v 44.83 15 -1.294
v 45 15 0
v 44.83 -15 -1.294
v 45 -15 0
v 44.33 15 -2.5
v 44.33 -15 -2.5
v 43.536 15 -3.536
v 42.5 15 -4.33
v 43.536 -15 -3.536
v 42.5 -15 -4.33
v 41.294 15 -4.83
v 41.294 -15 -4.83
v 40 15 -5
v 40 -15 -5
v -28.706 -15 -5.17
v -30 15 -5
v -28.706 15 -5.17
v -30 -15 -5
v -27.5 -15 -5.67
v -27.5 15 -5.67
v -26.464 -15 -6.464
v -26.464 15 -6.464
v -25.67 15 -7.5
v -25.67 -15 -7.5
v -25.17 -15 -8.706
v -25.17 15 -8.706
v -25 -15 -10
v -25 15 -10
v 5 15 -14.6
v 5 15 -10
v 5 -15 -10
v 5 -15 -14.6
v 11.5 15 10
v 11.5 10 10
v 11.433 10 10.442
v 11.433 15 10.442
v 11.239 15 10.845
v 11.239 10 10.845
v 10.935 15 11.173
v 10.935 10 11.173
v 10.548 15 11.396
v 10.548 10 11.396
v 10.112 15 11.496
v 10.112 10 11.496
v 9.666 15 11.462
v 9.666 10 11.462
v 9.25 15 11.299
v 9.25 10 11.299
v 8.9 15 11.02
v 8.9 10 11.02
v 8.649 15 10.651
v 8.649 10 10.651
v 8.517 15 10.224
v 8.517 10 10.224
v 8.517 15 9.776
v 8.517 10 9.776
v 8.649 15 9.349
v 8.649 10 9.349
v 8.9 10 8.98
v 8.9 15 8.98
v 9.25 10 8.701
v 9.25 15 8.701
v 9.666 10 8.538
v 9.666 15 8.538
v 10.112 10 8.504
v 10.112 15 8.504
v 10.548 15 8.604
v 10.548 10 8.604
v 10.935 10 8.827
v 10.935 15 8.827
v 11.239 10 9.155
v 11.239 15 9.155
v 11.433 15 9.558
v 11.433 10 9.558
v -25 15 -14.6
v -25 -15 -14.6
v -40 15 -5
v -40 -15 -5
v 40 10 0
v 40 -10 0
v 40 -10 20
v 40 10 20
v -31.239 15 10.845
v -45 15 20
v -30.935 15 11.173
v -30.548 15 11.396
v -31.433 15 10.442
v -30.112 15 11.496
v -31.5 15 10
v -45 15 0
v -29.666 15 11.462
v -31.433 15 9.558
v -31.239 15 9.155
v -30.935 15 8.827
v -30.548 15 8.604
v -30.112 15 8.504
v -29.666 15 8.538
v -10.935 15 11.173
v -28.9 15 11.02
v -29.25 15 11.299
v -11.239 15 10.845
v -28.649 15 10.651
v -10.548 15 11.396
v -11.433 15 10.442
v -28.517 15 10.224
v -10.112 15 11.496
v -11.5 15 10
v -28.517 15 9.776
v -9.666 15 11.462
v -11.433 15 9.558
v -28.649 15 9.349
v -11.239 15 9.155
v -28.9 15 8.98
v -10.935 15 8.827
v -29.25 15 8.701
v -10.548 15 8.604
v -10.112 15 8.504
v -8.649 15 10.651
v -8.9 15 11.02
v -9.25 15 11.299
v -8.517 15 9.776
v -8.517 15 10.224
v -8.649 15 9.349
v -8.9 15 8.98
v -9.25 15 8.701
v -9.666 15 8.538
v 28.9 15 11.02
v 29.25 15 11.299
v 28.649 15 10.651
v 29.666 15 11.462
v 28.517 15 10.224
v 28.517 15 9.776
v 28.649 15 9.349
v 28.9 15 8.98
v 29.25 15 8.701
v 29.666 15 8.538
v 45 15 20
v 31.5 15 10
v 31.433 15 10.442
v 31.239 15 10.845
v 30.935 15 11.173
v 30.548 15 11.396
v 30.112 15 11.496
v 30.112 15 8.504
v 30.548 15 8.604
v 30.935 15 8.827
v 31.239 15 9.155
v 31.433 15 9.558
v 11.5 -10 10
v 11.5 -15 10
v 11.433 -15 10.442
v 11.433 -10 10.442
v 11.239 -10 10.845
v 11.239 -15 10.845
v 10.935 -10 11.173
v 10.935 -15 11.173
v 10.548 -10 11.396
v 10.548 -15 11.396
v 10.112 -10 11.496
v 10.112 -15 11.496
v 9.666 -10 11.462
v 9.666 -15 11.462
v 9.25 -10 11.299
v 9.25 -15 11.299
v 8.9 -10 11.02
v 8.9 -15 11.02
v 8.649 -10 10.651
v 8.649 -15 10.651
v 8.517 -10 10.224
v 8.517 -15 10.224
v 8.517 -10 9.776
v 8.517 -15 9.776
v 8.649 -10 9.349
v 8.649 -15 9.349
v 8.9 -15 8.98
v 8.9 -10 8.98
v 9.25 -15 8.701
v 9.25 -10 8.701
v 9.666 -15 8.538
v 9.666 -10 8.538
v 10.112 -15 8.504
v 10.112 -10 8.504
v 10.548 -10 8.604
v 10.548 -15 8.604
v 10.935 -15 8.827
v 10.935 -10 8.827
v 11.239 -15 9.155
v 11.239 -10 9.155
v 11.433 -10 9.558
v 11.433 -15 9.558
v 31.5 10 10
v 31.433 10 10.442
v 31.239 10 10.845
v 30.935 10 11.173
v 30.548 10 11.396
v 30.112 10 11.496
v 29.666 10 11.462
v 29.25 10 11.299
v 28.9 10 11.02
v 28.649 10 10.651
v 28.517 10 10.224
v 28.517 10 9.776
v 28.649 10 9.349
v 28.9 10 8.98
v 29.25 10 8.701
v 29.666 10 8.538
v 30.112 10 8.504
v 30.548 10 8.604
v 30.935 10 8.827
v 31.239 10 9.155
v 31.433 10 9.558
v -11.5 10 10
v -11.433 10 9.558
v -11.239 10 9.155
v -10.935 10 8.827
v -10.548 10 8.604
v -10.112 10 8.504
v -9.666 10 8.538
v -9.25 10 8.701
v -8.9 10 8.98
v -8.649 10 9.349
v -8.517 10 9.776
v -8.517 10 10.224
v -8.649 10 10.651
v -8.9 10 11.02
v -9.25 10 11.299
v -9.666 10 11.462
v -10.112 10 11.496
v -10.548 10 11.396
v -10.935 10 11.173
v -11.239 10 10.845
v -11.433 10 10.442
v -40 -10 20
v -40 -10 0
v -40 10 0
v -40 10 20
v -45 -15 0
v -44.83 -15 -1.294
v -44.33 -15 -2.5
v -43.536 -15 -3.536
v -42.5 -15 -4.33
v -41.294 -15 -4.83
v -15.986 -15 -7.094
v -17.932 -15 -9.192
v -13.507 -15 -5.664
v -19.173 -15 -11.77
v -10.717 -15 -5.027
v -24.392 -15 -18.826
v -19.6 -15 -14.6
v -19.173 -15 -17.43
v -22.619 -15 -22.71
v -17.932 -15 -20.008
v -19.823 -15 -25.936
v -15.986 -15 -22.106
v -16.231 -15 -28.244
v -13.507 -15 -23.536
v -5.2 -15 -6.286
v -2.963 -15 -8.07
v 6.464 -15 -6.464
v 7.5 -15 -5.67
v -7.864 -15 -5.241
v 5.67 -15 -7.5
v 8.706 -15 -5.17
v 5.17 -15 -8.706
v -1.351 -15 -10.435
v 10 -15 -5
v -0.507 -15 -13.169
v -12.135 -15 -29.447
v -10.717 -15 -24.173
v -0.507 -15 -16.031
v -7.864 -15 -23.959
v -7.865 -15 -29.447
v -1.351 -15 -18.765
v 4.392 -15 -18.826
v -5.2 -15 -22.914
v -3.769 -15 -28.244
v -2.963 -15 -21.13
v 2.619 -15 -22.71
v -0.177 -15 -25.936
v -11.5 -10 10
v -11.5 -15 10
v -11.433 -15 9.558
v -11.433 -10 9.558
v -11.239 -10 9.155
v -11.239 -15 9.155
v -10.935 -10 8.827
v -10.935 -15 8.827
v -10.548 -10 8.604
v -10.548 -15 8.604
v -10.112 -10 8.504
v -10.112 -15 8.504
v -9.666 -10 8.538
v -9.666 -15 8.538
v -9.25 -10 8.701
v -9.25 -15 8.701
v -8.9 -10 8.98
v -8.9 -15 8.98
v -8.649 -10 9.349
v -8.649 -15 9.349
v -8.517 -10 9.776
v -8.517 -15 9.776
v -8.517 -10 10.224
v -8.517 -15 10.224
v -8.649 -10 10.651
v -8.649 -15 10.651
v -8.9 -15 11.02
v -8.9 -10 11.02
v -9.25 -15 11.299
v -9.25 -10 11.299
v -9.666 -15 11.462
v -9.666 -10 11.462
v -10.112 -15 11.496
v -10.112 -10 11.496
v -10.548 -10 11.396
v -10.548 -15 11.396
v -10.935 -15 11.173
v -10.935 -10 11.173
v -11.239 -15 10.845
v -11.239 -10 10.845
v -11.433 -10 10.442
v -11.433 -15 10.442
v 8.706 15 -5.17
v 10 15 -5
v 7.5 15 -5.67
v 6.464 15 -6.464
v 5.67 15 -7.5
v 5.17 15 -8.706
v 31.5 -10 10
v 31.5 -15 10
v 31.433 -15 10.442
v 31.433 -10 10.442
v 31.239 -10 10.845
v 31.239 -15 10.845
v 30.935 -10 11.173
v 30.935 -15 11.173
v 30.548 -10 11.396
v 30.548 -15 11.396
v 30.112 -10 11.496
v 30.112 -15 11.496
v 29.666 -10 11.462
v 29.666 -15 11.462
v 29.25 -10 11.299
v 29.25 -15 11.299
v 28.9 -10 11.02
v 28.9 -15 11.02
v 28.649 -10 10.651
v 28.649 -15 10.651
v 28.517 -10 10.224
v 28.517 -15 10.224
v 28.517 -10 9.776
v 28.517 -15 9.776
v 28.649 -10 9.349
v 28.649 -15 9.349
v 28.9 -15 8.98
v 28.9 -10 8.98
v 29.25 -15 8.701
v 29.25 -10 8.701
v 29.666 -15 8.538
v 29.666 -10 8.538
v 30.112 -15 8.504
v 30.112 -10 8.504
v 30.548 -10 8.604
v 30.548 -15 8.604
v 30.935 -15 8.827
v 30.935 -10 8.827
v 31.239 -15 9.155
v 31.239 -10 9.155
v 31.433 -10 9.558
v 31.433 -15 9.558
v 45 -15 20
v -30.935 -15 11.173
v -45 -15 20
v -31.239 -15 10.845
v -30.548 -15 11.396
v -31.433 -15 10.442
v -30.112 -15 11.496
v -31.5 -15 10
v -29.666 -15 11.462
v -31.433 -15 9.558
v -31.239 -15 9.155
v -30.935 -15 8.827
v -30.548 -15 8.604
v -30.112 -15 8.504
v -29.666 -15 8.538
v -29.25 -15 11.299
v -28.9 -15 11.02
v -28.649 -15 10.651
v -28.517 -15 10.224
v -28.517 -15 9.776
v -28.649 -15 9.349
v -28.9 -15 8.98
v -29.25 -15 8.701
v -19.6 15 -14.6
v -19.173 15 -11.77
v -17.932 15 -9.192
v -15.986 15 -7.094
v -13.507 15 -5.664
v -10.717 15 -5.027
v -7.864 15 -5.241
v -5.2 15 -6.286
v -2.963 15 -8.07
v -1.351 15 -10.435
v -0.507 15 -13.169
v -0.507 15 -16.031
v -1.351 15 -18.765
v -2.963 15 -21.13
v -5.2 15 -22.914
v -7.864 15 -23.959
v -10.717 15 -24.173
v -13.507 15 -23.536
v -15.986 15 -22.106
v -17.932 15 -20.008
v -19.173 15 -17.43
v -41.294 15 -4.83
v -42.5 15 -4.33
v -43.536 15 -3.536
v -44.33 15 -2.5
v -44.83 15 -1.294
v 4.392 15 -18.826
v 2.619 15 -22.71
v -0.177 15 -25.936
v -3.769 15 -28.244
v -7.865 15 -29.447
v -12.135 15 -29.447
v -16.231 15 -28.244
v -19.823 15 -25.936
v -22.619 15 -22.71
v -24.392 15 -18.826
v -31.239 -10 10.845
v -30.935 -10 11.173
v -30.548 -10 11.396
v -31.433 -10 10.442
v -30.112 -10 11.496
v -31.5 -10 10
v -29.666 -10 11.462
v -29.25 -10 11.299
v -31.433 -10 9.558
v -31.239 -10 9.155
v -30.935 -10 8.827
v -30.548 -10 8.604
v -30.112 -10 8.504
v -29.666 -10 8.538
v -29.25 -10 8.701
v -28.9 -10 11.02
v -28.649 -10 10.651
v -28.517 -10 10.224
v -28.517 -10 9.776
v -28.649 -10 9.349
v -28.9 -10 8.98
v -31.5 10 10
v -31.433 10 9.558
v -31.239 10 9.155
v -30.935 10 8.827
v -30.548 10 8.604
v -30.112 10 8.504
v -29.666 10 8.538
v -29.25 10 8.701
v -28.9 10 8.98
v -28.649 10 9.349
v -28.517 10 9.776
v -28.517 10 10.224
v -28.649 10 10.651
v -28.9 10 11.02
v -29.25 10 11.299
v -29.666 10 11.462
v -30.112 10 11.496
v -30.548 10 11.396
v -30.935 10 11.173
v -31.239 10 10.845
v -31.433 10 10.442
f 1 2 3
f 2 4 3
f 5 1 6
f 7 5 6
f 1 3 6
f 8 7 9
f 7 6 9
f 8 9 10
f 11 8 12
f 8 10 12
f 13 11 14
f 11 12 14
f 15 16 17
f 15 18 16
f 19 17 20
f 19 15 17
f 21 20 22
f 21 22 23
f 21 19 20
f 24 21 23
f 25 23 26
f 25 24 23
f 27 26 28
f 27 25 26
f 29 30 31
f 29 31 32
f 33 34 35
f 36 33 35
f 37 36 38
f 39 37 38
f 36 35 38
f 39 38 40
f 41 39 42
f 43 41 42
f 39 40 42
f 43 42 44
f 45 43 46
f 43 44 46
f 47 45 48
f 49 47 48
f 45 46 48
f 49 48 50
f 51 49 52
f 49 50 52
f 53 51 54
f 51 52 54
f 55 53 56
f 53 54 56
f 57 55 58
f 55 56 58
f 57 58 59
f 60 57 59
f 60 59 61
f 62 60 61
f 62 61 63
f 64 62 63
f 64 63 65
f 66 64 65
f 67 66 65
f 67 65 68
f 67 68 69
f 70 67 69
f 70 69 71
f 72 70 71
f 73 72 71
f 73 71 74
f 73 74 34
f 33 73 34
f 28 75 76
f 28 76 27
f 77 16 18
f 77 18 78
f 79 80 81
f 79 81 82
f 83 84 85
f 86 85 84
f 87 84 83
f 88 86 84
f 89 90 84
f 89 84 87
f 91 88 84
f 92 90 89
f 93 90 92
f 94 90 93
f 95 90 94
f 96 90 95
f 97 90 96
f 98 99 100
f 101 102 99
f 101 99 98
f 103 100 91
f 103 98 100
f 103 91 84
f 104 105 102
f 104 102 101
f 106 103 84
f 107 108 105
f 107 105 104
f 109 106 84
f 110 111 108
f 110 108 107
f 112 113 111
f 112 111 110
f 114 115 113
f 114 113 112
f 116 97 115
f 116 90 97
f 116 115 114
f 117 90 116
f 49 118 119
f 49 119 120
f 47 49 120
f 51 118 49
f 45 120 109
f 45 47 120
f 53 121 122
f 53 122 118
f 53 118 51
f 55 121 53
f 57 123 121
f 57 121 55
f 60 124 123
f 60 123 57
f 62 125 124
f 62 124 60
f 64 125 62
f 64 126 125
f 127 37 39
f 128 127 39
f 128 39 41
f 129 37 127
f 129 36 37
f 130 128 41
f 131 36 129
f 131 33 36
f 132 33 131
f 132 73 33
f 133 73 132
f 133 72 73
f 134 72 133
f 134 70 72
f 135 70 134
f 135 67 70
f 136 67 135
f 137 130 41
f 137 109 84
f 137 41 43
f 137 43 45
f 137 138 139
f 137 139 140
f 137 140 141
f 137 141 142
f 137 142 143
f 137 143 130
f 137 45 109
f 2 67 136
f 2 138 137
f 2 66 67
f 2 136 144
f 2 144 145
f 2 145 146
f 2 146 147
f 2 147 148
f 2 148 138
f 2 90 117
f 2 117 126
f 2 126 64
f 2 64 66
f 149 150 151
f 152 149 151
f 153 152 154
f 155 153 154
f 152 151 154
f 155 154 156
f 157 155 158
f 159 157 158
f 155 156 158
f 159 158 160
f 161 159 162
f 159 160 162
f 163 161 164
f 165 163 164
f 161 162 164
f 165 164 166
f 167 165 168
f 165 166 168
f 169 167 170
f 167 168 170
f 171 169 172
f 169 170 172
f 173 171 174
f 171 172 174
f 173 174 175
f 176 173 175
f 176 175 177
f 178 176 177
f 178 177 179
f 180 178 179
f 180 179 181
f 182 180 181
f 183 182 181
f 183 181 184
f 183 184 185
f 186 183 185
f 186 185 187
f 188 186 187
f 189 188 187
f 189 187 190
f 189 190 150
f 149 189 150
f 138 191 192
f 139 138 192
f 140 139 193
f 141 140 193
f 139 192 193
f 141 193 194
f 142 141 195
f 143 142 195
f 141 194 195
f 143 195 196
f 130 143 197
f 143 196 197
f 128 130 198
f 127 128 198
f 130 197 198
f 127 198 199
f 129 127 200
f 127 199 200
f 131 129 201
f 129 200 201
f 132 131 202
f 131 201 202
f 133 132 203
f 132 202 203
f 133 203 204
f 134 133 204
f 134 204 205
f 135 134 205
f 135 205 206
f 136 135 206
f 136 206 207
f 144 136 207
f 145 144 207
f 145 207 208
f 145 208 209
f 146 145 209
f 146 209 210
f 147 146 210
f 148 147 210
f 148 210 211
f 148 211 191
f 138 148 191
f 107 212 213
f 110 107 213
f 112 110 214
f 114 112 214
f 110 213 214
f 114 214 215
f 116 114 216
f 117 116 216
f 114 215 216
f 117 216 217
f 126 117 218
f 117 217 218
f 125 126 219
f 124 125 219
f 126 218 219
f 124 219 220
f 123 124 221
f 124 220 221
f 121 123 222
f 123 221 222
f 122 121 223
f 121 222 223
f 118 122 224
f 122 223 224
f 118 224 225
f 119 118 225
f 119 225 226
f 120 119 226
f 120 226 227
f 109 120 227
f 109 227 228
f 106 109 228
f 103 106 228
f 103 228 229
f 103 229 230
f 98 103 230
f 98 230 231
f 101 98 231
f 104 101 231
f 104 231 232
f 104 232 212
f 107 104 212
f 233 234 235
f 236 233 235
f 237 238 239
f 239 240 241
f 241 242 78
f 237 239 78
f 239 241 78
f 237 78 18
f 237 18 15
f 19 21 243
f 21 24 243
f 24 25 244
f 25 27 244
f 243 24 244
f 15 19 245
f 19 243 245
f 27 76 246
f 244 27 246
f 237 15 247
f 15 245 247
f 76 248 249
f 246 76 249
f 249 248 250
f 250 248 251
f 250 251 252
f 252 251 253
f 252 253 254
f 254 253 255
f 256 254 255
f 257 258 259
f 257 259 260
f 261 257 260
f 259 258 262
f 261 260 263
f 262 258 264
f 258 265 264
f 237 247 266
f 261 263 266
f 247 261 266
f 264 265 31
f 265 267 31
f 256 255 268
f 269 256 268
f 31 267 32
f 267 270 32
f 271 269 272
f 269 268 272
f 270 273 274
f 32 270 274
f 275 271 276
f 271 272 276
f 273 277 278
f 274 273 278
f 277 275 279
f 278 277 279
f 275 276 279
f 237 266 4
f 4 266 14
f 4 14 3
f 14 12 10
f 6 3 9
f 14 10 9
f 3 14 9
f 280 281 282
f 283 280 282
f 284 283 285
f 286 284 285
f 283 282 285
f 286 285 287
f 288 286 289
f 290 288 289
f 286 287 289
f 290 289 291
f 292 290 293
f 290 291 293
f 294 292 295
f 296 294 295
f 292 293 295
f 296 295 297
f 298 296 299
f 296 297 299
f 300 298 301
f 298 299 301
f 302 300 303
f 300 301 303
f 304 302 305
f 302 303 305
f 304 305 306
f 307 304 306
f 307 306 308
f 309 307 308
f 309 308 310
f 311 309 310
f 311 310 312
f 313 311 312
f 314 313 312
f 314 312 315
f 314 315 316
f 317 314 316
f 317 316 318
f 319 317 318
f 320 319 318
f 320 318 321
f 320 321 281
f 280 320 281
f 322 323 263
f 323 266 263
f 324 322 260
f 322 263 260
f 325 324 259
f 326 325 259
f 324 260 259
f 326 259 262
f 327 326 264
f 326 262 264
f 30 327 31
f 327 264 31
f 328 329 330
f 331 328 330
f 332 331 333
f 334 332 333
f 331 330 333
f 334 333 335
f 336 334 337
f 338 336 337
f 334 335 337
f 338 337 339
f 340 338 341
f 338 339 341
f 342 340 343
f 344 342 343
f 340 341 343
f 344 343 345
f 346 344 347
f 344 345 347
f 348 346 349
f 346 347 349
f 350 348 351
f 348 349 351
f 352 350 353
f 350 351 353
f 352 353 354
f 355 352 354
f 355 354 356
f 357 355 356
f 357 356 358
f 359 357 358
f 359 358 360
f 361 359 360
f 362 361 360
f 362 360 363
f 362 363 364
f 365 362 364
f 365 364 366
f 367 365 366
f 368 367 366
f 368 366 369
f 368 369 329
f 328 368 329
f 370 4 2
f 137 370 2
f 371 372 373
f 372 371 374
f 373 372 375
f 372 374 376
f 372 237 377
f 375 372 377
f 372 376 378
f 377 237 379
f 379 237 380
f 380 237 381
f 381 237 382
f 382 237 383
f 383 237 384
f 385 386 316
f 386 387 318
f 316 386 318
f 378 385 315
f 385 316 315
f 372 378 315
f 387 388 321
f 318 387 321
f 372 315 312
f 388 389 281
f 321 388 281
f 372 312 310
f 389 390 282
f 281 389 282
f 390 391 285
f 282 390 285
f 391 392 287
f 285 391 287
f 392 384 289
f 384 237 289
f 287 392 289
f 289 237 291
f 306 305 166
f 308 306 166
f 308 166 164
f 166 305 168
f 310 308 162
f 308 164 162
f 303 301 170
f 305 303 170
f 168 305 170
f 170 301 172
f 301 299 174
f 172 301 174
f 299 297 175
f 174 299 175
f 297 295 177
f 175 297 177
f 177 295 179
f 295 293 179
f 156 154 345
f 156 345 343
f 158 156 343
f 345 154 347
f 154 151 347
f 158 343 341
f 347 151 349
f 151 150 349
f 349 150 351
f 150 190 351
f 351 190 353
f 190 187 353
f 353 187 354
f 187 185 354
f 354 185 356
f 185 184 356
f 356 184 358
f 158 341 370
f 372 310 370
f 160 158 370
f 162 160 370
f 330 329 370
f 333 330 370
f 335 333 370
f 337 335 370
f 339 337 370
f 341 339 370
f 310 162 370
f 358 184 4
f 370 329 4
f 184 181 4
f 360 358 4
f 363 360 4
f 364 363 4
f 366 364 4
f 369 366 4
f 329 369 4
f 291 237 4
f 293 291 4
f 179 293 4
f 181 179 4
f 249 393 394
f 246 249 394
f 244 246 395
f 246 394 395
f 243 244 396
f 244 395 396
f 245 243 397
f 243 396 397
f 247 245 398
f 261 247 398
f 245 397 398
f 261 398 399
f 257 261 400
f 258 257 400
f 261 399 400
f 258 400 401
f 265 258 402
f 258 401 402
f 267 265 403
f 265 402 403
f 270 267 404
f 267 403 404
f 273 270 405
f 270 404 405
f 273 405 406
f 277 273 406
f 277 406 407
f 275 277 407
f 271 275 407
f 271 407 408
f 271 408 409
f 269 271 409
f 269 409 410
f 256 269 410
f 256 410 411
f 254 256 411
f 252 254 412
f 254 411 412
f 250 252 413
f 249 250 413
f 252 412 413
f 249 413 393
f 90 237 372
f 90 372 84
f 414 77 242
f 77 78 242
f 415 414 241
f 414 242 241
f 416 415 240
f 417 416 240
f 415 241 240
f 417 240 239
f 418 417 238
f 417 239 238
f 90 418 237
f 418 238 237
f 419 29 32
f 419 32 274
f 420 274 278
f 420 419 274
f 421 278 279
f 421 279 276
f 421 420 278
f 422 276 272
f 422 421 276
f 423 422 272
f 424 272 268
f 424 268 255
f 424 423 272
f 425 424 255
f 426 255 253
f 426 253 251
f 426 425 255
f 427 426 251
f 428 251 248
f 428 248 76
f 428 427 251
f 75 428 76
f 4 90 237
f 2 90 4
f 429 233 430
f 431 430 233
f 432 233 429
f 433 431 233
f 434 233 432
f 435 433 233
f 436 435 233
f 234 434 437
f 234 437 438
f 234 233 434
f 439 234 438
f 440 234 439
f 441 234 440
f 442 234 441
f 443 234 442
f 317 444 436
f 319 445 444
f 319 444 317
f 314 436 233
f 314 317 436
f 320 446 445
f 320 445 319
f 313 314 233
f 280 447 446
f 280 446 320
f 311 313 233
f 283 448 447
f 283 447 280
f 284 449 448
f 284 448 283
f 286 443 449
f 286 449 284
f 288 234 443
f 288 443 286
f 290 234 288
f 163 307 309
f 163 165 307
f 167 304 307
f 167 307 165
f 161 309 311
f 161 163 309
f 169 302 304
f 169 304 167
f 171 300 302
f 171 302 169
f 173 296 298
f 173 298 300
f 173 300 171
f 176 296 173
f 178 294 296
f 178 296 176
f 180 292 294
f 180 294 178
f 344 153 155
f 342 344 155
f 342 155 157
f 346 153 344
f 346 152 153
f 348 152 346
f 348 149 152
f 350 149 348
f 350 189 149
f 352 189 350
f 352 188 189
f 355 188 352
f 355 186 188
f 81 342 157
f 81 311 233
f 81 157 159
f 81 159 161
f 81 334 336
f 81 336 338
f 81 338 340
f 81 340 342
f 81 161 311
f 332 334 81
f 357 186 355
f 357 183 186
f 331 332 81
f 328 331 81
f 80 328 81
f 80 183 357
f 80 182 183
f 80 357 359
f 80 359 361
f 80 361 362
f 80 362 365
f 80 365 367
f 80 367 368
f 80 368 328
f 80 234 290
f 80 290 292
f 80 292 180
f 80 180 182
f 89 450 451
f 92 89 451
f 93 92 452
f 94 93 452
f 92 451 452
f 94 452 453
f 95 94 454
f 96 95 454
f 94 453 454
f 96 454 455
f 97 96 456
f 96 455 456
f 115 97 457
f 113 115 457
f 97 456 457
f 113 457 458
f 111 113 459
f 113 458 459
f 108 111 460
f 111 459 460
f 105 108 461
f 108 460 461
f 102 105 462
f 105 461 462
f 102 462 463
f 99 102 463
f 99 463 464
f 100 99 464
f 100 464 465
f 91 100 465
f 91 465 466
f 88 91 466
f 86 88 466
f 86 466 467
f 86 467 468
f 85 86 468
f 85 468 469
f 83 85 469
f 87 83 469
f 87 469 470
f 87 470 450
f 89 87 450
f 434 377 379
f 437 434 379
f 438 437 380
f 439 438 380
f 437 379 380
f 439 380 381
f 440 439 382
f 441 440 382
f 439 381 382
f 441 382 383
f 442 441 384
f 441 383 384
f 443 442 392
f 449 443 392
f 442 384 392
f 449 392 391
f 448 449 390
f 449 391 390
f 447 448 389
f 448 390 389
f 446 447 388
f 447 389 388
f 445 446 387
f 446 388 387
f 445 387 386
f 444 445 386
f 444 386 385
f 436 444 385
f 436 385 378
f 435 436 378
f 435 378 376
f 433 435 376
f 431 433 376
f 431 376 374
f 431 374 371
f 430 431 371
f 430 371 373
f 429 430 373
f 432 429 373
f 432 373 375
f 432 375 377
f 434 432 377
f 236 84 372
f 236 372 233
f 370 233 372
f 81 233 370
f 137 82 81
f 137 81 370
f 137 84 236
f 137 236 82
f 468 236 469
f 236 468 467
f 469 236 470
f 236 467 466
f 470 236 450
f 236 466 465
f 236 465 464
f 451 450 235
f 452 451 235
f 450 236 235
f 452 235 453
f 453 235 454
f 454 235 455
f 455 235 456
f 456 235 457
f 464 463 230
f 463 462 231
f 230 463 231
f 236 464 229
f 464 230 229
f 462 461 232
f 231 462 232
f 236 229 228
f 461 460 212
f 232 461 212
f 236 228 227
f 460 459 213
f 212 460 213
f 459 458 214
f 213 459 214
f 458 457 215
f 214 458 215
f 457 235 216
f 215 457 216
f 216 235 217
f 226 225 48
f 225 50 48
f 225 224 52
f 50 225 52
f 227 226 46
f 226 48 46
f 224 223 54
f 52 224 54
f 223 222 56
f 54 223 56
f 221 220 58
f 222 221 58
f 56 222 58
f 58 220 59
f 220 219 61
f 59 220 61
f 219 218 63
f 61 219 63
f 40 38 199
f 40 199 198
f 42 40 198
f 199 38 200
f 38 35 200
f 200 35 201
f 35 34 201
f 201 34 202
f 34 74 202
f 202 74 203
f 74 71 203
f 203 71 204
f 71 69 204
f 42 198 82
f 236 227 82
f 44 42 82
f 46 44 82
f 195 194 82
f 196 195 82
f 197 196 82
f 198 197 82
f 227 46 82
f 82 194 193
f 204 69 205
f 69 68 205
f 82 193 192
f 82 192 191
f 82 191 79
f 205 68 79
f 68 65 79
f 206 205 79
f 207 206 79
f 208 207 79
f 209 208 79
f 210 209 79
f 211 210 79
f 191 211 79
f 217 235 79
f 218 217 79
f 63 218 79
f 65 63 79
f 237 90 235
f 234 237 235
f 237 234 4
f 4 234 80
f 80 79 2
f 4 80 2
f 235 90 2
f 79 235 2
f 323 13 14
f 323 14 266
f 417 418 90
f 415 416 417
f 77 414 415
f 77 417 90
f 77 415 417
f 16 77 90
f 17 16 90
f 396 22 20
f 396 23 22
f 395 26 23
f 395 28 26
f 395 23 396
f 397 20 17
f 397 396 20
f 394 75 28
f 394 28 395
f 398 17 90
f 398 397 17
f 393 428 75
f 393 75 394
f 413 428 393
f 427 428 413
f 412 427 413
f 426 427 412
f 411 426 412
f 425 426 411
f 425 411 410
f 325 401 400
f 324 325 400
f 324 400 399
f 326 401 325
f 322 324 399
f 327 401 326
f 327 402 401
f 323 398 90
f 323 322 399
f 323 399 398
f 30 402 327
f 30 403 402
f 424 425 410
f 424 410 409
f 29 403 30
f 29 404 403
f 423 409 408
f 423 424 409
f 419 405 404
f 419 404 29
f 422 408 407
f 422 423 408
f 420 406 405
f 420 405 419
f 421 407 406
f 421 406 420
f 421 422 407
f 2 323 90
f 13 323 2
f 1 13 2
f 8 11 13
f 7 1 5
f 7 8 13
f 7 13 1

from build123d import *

# Parameters (mm, degrees)
ESQUISSE1_W             = 90
ESQUISSE1_H             = 30
ESQUISSE1_W_2           = 80
ESQUISSE1_H_2           = 20
BOSS_EXTRU_1_DEPTH      = 20
ENL_V_MAT_EXTRU_1_DEPTH = 30
ESQUISSE2_R             = 9.6
BOSS_EXTRU_3_DEPTH      = 30
CONG_1_R                = 5
CONG_2_R                = 5


with BuildPart() as part:
    # Esquisse1 → Boss.-Extru.1 (new body)
    with BuildSketch(Plane.XY):
        Rectangle(ESQUISSE1_W, ESQUISSE1_H)
        Rectangle(ESQUISSE1_W_2, ESQUISSE1_H_2, mode=Mode.SUBTRACT)
    extrude(amount=BOSS_EXTRU_1_DEPTH)

    # Esquisse3 → Enlèv. mat.-Extru.1 (cut)
    with BuildSketch(Plane.XZ.offset(15)):
        with BuildLine():
            ThreePointArc((28.5, 10), (30, 8.5), (31.5, 10))
            Line((31.5, 10), (28.5, 10))
        make_face()
        with BuildLine():
            Line((28.5, 10), (31.5, 10))
            ThreePointArc((31.5, 10), (30, 11.5), (28.5, 10))
        make_face()
        with BuildLine():
            ThreePointArc((8.5, 10), (10, 8.5), (11.5, 10))
            Line((11.5, 10), (8.5, 10))
        make_face()
        with BuildLine():
            Line((8.5, 10), (11.5, 10))
            ThreePointArc((11.5, 10), (10, 11.5), (8.5, 10))
        make_face()
        with BuildLine():
            ThreePointArc((-8.5, 10), (-10, 11.5), (-11.5, 10))
            Line((-11.5, 10), (-8.5, 10))
        make_face()
        with BuildLine():
            Line((-8.5, 10), (-11.5, 10))
            ThreePointArc((-11.5, 10), (-10, 8.5), (-8.5, 10))
        make_face()
        with BuildLine():
            ThreePointArc((-28.5, 10), (-30, 11.5), (-31.5, 10))
            Line((-31.5, 10), (-28.5, 10))
        make_face()
        with BuildLine():
            Line((-28.5, 10), (-31.5, 10))
            ThreePointArc((-31.5, 10), (-30, 8.5), (-28.5, 10))
        make_face()
    extrude(amount=-ENL_V_MAT_EXTRU_1_DEPTH, mode=Mode.SUBTRACT)


with BuildPart() as body_2:
    # Esquisse2 → Boss.-Extru.3 (new body)
    with BuildSketch(Plane(origin=(0, 15, 0), x_dir=(1, 0, 0), z_dir=(0, 1, 0))):
        with BuildLine():
            Line((-45, 5), (-45, 0))
            Line((-45, 0), (45, 0))
            Line((45, 0), (45, 5))
            Line((45, 5), (5, 5))
            Line((5, 5), (5, 14.6))
            ThreePointArc((5, 14.6), (-10, 29.6), (-25, 14.6))
            Line((-25, 14.6), (-25, 5))
            Line((-25, 5), (-45, 5))
        make_face()
        with Locations(Location((-10, 14.6, 0), (0, 0, 180))):
            Circle(ESQUISSE2_R, mode=Mode.SUBTRACT)
    extrude(amount=-BOSS_EXTRU_3_DEPTH)

    # Congé1
    cong_1_edges = [body_2.edges().sort_by_distance(p)[0] for p in [
        (-25, 0, -5),
        (5, 0, -5),
    ]]
    fillet(cong_1_edges, radius=CONG_1_R)

    # Congé2
    cong_2_edges = [body_2.edges().sort_by_distance(p)[0] for p in [
        (-45, 0, -5),
        (45, 0, -5),
    ]]
    fillet(cong_2_edges, radius=CONG_2_R - 0.0001)  # a hair under: the kernel refuses the full size


solid = Compound([part.part, body_2.part])
